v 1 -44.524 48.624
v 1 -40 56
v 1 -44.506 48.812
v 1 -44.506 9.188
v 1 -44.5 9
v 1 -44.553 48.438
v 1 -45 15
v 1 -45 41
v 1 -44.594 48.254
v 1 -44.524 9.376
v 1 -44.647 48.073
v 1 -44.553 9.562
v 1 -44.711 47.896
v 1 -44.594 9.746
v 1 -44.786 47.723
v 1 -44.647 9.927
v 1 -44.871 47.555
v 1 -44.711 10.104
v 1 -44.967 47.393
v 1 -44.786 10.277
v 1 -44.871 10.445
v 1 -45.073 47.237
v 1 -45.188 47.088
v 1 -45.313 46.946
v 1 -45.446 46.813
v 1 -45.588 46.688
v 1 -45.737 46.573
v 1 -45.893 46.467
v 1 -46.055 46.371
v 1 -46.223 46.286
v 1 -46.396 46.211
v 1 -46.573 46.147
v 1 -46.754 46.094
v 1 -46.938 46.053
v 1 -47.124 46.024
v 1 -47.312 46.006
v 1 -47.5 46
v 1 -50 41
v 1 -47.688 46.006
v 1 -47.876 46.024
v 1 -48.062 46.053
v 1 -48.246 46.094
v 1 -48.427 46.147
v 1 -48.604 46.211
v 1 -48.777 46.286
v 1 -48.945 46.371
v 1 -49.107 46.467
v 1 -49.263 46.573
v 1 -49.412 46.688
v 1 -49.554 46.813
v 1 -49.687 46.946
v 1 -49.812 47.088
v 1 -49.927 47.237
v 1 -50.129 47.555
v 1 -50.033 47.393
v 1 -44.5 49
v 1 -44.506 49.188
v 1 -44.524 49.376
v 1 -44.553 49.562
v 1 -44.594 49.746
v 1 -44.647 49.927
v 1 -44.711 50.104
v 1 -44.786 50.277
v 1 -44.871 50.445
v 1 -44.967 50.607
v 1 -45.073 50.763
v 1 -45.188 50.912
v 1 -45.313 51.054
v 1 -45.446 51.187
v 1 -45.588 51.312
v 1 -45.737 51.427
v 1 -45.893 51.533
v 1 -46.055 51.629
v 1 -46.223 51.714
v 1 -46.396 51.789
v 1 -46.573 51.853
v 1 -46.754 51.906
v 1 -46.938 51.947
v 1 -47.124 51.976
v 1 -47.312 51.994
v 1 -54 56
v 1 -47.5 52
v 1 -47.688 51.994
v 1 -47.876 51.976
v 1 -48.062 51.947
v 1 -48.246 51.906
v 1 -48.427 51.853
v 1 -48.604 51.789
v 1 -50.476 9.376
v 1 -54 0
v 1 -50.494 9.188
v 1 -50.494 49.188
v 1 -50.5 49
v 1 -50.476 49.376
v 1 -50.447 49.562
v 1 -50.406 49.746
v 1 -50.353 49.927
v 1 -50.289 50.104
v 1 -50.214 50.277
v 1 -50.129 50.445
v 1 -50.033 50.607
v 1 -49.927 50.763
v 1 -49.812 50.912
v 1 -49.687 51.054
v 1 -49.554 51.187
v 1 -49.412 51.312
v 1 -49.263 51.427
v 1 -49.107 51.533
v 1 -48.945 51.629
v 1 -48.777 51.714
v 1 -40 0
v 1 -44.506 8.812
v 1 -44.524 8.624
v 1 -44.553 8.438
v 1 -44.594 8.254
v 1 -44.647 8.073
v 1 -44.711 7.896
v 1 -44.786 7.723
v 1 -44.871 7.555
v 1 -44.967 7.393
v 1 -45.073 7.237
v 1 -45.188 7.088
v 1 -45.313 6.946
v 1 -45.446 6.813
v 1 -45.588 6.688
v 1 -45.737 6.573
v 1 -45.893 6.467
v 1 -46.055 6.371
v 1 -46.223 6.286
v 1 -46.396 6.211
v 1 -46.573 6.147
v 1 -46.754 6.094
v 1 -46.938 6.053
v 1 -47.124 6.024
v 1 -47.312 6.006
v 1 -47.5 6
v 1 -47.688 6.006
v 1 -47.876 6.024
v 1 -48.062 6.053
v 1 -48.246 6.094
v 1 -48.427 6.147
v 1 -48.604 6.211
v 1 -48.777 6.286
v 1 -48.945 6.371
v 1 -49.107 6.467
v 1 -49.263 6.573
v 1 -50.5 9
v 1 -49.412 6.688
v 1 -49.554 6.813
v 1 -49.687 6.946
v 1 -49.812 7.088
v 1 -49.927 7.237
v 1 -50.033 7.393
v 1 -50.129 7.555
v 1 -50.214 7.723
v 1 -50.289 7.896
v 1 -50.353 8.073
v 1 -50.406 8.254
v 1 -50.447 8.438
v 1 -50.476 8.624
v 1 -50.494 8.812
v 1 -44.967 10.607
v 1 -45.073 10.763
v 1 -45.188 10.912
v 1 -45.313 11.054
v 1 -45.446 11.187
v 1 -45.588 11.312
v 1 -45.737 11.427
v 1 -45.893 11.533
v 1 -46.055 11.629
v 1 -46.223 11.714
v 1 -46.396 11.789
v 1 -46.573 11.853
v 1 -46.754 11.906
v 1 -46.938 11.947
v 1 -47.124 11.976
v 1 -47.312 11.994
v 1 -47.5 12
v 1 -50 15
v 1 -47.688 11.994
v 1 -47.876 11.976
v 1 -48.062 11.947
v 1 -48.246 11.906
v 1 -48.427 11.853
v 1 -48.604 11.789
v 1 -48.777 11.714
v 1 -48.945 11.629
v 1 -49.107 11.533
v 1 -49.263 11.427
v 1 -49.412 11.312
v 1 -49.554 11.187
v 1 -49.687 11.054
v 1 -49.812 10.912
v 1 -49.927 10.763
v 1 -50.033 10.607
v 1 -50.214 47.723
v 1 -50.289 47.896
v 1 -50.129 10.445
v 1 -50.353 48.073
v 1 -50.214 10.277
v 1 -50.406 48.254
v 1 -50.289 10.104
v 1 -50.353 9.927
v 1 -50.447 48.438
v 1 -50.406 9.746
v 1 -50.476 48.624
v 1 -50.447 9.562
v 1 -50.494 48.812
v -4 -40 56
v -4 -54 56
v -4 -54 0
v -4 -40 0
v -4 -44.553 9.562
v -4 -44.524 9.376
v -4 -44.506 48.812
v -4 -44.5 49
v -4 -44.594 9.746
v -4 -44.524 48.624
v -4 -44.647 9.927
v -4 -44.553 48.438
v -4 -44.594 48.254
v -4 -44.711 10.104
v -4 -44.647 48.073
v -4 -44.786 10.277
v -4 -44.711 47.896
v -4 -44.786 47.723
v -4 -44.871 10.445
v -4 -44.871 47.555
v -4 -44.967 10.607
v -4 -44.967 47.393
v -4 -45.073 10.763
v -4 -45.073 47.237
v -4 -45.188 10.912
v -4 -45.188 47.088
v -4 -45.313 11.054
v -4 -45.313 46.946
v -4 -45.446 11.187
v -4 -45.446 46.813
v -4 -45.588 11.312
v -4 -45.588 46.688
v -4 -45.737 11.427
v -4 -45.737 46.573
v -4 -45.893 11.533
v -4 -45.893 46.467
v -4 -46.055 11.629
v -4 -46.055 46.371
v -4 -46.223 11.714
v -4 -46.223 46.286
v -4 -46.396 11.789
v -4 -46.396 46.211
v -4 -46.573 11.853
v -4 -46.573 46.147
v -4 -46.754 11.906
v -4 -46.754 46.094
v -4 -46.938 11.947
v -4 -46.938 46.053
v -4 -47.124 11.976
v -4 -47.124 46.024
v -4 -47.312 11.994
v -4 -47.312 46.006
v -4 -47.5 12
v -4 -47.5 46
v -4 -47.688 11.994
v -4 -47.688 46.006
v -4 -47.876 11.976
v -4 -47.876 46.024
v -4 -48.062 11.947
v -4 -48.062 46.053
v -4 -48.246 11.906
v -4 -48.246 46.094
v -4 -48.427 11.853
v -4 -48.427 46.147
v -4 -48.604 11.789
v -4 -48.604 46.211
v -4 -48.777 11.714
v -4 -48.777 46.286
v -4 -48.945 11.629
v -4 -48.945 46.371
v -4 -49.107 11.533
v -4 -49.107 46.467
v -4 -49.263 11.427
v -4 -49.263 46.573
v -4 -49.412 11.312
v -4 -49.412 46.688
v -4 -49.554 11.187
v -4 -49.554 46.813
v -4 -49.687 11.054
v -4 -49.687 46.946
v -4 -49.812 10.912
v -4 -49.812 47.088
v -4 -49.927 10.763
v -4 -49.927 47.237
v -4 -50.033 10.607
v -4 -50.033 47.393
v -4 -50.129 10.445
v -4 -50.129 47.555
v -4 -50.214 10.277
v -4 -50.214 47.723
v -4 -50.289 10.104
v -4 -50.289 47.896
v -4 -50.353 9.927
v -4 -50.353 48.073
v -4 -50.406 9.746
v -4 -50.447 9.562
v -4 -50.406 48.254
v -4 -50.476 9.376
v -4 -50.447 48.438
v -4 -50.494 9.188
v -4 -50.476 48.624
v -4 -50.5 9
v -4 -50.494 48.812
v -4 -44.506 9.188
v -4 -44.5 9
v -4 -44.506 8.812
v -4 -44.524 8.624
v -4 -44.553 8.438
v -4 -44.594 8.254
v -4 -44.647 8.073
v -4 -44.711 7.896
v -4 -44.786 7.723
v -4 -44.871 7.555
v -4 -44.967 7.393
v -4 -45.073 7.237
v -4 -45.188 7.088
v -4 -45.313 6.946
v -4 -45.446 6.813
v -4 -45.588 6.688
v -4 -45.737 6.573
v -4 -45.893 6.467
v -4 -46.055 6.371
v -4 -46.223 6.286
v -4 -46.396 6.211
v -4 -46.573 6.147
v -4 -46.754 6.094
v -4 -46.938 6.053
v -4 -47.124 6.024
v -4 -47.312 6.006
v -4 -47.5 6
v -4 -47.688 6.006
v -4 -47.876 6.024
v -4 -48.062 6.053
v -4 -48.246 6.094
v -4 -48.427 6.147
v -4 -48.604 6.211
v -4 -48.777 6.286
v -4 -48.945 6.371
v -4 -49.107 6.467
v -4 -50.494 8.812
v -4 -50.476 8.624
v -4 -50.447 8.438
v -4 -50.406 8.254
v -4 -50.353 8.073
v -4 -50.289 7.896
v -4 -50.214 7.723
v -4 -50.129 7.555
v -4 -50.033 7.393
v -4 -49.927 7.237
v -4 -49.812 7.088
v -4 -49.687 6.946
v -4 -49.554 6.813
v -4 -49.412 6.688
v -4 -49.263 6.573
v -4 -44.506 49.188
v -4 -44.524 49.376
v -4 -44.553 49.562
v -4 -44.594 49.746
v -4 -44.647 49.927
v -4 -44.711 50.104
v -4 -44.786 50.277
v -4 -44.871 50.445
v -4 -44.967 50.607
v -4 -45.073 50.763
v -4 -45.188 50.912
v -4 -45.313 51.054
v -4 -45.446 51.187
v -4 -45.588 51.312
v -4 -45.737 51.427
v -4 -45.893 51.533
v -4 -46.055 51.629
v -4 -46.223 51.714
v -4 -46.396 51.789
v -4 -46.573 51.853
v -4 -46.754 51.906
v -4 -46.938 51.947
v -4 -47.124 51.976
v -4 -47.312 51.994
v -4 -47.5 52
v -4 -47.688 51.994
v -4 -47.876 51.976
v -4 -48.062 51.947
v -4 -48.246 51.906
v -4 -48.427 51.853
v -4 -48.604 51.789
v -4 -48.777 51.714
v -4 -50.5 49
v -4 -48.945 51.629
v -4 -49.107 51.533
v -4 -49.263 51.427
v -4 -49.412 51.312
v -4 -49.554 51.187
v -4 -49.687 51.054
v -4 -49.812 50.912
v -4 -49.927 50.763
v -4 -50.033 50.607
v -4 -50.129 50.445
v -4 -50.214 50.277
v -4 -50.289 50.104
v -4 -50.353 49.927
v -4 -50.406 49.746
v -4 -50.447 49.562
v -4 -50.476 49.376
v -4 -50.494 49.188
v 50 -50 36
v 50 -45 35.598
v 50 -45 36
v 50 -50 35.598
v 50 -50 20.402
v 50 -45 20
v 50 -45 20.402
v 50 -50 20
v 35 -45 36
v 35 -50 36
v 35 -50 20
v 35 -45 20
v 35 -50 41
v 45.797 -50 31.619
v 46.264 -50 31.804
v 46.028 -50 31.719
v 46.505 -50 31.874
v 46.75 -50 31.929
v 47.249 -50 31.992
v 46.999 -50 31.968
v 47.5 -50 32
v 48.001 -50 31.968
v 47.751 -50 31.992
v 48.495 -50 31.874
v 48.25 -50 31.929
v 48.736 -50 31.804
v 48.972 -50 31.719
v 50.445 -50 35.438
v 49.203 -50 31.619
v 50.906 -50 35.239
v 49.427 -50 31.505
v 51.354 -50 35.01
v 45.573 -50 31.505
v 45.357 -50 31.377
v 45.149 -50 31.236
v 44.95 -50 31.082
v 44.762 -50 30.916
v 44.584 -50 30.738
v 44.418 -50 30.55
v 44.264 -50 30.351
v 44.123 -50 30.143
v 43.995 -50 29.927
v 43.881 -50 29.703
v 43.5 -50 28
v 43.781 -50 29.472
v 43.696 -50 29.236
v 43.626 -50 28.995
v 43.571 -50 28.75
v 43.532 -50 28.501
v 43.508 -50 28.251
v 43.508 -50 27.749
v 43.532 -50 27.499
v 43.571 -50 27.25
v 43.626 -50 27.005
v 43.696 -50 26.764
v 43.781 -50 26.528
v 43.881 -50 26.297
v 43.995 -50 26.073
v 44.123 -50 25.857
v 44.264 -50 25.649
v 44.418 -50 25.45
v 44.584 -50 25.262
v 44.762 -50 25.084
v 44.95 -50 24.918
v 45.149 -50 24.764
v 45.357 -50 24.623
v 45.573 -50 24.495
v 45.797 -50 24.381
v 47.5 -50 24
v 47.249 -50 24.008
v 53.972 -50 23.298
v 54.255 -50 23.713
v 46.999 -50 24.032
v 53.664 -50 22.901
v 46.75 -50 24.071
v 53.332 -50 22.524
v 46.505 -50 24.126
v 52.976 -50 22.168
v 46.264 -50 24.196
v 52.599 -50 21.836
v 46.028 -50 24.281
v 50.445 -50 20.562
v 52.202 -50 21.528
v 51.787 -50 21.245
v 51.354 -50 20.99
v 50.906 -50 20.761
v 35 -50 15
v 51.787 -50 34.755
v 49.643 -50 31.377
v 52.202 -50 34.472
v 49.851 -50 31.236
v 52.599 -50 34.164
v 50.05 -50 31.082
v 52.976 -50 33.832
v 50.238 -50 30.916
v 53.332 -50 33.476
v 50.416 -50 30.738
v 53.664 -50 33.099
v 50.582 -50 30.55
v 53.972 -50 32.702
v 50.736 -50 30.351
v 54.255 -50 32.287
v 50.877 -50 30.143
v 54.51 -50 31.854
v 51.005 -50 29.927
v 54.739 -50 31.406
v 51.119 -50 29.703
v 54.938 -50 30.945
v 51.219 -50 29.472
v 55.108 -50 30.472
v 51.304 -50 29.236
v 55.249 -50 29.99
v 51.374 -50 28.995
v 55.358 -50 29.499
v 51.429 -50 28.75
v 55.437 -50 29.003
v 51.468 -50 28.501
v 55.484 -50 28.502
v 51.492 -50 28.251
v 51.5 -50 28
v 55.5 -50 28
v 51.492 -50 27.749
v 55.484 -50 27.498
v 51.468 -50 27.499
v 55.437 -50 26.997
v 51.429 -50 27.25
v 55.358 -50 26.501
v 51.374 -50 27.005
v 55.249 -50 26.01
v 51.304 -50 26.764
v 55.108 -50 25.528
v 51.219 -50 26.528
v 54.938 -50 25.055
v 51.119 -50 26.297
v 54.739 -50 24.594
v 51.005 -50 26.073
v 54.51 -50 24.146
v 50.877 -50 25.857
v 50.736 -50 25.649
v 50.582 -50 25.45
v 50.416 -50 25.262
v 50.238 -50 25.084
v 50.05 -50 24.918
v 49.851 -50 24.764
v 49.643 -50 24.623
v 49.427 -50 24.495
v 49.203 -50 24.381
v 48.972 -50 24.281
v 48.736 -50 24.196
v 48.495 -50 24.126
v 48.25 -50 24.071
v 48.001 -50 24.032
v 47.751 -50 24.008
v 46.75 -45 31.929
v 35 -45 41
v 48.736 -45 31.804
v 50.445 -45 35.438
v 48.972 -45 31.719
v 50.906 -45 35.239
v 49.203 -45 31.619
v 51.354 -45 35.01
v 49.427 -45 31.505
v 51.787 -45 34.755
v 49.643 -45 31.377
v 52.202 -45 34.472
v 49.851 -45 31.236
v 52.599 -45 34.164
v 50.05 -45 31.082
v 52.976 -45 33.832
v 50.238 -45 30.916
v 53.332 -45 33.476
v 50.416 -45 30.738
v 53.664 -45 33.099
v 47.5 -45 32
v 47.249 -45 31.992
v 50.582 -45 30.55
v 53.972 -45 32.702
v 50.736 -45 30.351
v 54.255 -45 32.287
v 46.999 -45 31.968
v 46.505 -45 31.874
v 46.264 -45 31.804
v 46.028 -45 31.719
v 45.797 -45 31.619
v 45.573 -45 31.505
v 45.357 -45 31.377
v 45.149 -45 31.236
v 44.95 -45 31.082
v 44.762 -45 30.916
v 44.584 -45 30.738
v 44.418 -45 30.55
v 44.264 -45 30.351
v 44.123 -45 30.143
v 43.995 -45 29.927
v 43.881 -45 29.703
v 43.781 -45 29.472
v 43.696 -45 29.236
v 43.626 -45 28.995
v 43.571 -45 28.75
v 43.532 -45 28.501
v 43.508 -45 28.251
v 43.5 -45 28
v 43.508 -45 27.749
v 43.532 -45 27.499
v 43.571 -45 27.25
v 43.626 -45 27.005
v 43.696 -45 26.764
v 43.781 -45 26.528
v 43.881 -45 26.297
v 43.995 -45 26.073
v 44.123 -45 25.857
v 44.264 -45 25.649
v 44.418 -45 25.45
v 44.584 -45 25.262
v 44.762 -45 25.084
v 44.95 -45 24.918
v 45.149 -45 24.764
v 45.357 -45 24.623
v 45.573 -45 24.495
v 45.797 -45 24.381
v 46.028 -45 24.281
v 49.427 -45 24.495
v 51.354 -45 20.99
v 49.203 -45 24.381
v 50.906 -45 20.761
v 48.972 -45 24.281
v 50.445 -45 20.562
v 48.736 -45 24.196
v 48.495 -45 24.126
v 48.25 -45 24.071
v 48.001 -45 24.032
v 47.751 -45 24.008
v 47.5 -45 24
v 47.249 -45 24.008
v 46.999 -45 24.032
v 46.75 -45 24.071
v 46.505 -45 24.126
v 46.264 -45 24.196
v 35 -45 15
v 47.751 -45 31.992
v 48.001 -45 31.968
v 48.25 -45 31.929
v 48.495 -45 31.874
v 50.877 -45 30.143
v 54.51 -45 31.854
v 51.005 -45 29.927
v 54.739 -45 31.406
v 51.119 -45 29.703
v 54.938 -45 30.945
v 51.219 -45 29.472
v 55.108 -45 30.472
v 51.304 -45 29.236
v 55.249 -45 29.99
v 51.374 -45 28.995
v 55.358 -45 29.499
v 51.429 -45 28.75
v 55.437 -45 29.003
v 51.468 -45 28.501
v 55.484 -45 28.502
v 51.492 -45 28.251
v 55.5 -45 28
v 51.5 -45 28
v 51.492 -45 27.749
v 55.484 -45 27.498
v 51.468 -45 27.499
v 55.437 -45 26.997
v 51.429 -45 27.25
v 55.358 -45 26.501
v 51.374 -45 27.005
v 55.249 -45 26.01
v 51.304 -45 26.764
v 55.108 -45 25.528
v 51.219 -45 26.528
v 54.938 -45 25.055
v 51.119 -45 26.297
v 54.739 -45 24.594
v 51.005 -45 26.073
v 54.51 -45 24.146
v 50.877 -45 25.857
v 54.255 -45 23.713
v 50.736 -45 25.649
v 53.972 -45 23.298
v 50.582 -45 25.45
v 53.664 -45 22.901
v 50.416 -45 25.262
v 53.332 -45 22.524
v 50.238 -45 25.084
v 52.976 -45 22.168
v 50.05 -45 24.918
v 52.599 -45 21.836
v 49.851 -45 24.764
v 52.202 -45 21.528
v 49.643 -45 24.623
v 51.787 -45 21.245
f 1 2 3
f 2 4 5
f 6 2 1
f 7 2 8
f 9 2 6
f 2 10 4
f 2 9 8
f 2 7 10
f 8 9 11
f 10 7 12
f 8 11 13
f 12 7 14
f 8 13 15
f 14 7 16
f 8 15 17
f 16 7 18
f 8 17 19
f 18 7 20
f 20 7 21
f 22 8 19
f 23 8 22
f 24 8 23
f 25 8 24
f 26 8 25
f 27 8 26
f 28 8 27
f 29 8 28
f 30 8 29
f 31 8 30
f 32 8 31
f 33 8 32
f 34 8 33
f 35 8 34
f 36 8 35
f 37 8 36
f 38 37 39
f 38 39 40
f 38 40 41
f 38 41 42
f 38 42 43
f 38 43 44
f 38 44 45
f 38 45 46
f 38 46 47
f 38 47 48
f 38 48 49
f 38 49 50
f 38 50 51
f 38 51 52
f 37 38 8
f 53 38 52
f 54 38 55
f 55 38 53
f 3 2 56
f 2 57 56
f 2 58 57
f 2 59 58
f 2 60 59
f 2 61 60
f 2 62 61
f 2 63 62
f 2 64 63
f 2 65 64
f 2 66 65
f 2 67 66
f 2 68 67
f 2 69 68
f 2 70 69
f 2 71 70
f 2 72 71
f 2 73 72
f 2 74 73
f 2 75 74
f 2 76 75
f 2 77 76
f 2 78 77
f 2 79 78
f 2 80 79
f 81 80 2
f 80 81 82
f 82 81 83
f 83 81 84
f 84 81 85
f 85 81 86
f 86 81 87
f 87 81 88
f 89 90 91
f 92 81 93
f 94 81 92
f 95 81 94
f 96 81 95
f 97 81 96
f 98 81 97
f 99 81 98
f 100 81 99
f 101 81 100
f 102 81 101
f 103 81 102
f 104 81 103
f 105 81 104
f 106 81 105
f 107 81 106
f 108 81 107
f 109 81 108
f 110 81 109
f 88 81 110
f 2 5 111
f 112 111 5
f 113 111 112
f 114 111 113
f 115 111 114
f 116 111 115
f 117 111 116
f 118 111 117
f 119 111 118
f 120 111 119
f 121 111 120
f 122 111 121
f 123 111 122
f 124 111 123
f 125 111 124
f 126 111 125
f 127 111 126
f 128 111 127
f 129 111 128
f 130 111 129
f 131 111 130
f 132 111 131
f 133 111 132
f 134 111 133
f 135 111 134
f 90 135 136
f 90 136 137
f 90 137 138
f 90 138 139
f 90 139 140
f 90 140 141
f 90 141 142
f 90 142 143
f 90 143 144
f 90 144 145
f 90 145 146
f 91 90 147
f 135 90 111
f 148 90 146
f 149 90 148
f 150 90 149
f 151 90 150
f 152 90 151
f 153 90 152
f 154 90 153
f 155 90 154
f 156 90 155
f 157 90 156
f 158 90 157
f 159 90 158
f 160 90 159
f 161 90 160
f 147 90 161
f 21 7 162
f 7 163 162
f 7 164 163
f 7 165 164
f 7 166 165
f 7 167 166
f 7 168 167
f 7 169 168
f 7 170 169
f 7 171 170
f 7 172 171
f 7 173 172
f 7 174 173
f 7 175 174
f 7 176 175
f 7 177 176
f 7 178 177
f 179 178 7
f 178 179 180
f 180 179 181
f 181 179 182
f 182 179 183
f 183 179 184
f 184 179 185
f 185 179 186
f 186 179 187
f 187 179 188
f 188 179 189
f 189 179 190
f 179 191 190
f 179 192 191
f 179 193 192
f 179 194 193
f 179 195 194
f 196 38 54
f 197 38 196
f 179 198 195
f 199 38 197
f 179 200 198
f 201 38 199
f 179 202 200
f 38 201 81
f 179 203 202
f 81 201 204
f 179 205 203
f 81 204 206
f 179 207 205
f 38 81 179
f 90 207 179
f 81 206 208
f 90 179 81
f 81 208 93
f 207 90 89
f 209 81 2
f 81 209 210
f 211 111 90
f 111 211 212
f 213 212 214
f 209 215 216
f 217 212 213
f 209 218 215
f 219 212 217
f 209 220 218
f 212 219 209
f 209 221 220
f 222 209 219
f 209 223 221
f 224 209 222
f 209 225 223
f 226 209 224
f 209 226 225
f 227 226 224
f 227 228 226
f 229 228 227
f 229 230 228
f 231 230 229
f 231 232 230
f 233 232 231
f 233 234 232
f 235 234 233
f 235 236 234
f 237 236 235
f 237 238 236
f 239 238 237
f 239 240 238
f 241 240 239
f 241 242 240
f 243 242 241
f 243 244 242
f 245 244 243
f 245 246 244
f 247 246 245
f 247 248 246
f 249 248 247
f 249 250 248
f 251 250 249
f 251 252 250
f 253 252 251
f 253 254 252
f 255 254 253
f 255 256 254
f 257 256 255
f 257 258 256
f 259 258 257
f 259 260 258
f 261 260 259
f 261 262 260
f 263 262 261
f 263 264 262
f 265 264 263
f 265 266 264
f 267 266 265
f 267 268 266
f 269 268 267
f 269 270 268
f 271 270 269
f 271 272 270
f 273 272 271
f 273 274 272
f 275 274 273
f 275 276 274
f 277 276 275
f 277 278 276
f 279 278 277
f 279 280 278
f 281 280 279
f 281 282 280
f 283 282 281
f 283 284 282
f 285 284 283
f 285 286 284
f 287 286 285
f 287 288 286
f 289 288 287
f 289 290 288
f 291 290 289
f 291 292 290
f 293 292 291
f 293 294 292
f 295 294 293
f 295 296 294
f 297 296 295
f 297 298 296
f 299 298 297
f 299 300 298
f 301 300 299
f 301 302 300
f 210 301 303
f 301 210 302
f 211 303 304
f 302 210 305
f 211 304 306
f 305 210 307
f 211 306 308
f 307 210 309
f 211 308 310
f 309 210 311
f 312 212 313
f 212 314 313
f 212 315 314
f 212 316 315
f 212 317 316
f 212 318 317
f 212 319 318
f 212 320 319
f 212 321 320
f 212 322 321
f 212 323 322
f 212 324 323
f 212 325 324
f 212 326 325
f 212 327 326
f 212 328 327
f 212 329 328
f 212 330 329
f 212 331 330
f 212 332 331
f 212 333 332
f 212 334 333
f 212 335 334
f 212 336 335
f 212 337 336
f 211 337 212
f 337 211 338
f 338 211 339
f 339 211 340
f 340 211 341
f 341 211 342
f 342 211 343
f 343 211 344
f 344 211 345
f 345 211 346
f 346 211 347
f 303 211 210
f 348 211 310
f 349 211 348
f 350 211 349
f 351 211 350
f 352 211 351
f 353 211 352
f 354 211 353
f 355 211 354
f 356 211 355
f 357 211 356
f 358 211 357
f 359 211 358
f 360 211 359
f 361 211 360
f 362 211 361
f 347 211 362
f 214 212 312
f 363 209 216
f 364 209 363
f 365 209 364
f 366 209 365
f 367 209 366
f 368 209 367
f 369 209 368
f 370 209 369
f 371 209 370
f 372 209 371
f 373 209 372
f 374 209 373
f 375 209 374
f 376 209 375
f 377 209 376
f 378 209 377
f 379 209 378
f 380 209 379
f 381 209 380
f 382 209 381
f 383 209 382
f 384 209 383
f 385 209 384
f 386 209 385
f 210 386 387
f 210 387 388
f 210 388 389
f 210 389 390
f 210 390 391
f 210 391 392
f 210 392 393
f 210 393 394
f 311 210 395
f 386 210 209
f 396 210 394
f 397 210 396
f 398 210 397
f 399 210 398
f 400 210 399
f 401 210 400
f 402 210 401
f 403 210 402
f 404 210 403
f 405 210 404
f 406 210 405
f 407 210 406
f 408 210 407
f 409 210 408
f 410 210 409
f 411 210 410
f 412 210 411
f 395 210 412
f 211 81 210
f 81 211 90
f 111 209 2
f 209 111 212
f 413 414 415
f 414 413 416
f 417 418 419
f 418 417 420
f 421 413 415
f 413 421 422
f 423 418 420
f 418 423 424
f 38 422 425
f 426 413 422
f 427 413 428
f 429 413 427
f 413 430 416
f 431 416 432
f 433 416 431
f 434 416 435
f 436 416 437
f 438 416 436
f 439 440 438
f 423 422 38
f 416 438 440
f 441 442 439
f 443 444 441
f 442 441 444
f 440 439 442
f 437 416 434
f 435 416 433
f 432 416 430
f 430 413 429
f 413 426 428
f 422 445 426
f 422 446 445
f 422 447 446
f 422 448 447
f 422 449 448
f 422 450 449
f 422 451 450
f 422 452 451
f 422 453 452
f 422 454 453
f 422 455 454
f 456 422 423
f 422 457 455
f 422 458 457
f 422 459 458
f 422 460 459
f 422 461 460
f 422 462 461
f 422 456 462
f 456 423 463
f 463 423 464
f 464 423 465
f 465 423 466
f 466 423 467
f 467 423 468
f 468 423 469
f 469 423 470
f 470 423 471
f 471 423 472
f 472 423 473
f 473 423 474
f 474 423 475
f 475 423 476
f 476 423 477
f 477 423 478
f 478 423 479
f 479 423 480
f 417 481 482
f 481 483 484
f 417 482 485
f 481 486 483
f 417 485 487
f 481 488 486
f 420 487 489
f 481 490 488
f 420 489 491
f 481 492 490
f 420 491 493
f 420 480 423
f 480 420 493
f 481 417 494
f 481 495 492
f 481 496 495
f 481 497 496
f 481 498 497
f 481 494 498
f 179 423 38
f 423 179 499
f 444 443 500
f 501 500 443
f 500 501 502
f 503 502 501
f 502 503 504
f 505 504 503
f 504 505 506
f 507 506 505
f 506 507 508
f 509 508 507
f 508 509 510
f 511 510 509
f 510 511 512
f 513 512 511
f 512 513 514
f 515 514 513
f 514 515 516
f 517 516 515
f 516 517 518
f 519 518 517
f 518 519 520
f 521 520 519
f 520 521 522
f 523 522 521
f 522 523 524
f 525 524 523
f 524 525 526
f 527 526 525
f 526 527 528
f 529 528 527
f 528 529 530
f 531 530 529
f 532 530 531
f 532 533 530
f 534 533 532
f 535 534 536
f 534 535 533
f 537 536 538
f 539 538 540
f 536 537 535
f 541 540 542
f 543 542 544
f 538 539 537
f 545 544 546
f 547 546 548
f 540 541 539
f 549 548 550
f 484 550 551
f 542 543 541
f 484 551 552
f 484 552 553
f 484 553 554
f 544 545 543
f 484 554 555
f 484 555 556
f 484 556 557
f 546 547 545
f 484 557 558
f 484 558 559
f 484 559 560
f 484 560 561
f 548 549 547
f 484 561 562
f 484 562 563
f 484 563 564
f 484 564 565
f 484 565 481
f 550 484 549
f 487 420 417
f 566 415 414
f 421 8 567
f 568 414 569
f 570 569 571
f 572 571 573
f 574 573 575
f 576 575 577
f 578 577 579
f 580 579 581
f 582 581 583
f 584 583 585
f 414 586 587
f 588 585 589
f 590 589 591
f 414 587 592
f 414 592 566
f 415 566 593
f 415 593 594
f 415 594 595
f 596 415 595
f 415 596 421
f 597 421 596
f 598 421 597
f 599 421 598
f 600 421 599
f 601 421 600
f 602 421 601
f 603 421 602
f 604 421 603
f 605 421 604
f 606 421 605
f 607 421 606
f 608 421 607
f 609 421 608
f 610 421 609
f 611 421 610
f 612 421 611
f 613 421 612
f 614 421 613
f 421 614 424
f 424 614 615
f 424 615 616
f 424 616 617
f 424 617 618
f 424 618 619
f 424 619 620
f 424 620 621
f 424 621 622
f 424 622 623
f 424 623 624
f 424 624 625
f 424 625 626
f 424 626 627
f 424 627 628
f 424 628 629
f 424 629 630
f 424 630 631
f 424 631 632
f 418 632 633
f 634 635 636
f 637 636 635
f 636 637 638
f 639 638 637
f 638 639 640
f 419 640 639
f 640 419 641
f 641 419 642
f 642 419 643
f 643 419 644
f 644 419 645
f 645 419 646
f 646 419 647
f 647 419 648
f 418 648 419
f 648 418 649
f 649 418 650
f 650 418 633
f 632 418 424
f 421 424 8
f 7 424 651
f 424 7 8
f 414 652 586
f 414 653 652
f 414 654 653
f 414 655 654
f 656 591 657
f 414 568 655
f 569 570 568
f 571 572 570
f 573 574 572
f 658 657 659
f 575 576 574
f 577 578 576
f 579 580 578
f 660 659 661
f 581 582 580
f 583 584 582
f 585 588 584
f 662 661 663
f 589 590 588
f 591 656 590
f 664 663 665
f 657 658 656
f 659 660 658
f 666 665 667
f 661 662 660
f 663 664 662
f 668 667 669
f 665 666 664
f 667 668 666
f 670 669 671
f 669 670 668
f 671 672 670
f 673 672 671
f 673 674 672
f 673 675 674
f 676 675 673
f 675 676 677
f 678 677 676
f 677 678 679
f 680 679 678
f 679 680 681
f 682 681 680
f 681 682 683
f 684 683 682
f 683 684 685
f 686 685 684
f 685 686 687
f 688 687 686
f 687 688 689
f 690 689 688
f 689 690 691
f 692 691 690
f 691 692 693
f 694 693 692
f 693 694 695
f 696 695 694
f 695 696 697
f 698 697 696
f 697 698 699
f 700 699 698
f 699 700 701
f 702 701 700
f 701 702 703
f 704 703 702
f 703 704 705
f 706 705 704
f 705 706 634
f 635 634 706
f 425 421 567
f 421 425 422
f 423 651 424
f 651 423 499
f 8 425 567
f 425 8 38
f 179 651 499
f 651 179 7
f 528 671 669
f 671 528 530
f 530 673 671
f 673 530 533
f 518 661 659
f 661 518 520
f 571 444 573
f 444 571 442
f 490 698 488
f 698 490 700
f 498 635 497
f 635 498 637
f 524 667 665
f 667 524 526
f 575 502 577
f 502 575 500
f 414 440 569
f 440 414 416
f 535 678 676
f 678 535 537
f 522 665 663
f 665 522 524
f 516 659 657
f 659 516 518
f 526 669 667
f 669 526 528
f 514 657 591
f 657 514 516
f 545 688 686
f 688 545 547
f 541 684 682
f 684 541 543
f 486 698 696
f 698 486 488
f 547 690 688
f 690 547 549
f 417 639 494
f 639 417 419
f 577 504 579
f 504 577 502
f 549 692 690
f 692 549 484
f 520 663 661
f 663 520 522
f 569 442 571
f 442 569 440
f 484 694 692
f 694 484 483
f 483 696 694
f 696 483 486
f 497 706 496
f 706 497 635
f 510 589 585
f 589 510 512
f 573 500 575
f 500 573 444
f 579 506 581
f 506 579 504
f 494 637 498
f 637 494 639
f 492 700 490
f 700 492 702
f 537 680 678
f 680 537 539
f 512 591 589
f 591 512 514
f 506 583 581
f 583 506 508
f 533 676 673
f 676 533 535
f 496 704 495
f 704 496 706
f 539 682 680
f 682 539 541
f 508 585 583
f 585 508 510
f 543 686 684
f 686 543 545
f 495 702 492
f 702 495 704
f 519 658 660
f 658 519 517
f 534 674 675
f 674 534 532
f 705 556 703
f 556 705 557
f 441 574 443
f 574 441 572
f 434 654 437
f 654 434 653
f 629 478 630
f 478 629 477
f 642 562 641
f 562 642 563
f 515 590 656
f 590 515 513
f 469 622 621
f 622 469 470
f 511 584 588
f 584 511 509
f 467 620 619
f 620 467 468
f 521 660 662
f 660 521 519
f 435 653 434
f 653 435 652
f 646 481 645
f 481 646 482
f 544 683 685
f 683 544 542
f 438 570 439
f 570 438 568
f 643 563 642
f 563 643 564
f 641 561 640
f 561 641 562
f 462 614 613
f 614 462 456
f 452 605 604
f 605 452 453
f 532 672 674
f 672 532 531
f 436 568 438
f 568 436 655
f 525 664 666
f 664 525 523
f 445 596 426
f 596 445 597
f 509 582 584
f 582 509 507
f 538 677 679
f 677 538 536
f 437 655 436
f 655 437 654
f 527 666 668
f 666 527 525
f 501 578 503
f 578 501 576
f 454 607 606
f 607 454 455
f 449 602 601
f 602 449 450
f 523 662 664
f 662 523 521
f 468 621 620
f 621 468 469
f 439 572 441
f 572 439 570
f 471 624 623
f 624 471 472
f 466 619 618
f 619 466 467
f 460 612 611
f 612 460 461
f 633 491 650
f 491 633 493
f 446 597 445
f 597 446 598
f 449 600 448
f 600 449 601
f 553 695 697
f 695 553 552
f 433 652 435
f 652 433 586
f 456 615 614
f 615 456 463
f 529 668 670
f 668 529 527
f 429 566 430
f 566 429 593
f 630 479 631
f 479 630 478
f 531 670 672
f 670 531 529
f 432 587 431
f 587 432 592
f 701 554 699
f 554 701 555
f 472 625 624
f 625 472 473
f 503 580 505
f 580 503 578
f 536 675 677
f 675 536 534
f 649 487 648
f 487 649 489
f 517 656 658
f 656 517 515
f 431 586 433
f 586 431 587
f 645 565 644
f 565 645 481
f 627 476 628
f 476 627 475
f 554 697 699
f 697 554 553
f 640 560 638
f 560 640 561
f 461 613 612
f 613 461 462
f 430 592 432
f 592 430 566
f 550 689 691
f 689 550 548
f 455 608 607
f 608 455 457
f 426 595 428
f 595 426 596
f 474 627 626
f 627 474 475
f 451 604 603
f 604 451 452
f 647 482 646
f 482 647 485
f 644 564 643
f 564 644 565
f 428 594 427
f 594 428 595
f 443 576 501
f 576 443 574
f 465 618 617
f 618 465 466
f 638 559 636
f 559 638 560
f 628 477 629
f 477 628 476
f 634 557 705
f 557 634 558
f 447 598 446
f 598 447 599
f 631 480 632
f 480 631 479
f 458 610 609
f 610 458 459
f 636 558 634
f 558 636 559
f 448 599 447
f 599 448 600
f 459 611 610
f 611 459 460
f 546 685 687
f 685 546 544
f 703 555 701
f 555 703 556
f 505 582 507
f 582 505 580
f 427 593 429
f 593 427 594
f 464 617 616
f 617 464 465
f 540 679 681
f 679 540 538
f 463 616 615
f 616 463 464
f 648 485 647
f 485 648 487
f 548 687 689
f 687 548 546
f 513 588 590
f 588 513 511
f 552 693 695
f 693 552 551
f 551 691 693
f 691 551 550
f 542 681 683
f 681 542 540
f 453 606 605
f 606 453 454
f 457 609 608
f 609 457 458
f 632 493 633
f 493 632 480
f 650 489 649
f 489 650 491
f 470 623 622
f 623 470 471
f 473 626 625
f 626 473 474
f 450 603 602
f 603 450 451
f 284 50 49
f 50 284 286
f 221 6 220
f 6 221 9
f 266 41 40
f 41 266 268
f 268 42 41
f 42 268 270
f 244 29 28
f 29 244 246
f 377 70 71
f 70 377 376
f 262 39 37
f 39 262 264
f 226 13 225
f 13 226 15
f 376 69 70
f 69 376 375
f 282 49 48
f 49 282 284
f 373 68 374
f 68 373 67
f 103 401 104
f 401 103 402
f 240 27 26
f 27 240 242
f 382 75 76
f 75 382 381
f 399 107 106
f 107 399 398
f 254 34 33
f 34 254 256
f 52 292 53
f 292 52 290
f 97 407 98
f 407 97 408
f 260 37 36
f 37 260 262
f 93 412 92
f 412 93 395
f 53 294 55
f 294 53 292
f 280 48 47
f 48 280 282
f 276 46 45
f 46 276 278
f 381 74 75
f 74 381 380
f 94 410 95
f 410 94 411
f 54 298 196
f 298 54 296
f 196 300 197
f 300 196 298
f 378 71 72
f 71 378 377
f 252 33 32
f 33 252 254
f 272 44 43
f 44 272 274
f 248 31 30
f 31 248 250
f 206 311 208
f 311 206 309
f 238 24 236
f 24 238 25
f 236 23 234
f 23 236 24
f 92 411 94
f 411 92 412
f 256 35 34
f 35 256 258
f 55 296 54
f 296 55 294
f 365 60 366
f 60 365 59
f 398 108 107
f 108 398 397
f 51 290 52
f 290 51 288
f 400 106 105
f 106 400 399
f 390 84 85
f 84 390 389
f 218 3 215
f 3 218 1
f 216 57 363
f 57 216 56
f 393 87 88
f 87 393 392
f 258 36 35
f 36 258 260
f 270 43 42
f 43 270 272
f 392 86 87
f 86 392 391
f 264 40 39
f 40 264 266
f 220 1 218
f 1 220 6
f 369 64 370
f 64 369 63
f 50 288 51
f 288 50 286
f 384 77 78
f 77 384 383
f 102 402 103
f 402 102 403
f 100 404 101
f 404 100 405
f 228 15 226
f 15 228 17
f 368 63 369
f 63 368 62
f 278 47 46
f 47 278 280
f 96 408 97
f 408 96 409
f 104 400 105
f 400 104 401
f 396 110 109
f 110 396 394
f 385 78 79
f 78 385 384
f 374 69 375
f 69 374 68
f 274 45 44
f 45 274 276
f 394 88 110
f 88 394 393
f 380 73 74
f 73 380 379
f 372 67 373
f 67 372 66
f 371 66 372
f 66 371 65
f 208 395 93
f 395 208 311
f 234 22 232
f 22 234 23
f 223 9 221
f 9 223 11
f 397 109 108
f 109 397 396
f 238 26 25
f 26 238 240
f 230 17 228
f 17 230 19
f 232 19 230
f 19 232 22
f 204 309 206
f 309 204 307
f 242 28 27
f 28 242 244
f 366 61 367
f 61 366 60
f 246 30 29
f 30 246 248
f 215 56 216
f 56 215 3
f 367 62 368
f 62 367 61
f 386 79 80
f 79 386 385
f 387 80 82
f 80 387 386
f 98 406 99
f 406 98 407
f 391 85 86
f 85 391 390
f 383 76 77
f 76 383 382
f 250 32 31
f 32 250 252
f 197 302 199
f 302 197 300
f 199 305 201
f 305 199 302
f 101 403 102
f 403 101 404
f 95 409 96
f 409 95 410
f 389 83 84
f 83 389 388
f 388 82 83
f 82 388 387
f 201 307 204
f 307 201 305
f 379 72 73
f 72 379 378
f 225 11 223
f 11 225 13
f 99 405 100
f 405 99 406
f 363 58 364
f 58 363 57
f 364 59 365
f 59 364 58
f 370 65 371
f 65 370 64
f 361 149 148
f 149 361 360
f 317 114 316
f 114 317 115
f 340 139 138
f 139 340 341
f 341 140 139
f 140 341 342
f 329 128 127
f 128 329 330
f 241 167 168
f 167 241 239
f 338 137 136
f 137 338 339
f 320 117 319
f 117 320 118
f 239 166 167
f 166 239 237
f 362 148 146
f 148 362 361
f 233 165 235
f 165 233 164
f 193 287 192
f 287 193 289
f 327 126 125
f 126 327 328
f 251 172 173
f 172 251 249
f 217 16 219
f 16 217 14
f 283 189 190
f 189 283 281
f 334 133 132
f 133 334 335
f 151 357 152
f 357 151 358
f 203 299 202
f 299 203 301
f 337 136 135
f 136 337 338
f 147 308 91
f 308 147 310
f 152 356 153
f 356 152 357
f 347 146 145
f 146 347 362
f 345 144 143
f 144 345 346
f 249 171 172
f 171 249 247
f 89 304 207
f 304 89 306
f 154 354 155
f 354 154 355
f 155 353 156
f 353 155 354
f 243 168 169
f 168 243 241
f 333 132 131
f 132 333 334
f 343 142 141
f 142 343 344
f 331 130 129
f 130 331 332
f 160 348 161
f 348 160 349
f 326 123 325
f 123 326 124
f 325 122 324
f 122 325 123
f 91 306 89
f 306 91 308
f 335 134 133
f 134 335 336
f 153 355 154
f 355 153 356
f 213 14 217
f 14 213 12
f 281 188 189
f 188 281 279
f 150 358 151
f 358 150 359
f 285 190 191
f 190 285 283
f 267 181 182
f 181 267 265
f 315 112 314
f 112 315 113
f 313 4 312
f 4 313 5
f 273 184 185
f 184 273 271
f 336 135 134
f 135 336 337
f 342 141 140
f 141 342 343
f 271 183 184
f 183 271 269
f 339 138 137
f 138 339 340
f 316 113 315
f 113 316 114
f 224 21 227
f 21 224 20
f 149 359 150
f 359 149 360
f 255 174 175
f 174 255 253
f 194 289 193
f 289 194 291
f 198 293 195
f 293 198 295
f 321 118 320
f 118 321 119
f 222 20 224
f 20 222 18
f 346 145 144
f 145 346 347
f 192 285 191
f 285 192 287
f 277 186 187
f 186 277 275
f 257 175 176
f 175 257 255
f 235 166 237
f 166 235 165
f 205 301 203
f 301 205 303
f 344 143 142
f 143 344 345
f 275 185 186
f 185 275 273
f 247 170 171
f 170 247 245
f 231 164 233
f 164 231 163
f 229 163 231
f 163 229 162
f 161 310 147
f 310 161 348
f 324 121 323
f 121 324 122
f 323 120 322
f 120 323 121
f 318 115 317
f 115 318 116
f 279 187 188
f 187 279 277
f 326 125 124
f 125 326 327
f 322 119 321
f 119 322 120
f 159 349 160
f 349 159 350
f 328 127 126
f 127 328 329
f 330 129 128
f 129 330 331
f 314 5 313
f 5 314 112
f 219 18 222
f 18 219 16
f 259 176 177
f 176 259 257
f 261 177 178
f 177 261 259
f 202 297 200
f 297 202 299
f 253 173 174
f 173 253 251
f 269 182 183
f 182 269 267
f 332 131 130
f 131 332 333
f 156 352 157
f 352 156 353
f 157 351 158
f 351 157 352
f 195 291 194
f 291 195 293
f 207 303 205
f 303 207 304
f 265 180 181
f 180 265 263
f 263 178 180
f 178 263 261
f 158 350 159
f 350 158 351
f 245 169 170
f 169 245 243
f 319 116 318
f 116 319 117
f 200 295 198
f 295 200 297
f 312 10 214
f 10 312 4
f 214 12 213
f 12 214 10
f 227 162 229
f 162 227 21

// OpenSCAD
mirror(v= [0,180,0] ) {
    
difference(){
	union(){
        
        translate([0-4,40,-0]){
           cube([5,14,56], center=false);
        }
        translate([0,45,20]){
           cube([50,5,16], center=false);
        }
        translate([0,45,15]){
           cube([35,5,26], center=false);
        }
      
        translate([47/2+5+8+3+8,45+5,20+8]){
            rotate([90,0,0]){
                cylinder(h=5, r=8, $fn=100, center=false);
            }
        }
 
	}
	union() {

        translate([47/2+5+8+3+8,57-9,20+8]){
            rotate([90,0,0]){
                cylinder(h=8, r=4, $fn=100, center=true);
            }
        }

        translate([0,47.5,42+7]){
            rotate([0,90,0]){
                cylinder(h=200, r=3, $fn=100, center=true);
            }
        }
        translate([0,47.5,42-26-7]){
            rotate([0,90,0]){
                cylinder(h=200, r=3, $fn=100, center=true);
            }
        }

	}
}
}
